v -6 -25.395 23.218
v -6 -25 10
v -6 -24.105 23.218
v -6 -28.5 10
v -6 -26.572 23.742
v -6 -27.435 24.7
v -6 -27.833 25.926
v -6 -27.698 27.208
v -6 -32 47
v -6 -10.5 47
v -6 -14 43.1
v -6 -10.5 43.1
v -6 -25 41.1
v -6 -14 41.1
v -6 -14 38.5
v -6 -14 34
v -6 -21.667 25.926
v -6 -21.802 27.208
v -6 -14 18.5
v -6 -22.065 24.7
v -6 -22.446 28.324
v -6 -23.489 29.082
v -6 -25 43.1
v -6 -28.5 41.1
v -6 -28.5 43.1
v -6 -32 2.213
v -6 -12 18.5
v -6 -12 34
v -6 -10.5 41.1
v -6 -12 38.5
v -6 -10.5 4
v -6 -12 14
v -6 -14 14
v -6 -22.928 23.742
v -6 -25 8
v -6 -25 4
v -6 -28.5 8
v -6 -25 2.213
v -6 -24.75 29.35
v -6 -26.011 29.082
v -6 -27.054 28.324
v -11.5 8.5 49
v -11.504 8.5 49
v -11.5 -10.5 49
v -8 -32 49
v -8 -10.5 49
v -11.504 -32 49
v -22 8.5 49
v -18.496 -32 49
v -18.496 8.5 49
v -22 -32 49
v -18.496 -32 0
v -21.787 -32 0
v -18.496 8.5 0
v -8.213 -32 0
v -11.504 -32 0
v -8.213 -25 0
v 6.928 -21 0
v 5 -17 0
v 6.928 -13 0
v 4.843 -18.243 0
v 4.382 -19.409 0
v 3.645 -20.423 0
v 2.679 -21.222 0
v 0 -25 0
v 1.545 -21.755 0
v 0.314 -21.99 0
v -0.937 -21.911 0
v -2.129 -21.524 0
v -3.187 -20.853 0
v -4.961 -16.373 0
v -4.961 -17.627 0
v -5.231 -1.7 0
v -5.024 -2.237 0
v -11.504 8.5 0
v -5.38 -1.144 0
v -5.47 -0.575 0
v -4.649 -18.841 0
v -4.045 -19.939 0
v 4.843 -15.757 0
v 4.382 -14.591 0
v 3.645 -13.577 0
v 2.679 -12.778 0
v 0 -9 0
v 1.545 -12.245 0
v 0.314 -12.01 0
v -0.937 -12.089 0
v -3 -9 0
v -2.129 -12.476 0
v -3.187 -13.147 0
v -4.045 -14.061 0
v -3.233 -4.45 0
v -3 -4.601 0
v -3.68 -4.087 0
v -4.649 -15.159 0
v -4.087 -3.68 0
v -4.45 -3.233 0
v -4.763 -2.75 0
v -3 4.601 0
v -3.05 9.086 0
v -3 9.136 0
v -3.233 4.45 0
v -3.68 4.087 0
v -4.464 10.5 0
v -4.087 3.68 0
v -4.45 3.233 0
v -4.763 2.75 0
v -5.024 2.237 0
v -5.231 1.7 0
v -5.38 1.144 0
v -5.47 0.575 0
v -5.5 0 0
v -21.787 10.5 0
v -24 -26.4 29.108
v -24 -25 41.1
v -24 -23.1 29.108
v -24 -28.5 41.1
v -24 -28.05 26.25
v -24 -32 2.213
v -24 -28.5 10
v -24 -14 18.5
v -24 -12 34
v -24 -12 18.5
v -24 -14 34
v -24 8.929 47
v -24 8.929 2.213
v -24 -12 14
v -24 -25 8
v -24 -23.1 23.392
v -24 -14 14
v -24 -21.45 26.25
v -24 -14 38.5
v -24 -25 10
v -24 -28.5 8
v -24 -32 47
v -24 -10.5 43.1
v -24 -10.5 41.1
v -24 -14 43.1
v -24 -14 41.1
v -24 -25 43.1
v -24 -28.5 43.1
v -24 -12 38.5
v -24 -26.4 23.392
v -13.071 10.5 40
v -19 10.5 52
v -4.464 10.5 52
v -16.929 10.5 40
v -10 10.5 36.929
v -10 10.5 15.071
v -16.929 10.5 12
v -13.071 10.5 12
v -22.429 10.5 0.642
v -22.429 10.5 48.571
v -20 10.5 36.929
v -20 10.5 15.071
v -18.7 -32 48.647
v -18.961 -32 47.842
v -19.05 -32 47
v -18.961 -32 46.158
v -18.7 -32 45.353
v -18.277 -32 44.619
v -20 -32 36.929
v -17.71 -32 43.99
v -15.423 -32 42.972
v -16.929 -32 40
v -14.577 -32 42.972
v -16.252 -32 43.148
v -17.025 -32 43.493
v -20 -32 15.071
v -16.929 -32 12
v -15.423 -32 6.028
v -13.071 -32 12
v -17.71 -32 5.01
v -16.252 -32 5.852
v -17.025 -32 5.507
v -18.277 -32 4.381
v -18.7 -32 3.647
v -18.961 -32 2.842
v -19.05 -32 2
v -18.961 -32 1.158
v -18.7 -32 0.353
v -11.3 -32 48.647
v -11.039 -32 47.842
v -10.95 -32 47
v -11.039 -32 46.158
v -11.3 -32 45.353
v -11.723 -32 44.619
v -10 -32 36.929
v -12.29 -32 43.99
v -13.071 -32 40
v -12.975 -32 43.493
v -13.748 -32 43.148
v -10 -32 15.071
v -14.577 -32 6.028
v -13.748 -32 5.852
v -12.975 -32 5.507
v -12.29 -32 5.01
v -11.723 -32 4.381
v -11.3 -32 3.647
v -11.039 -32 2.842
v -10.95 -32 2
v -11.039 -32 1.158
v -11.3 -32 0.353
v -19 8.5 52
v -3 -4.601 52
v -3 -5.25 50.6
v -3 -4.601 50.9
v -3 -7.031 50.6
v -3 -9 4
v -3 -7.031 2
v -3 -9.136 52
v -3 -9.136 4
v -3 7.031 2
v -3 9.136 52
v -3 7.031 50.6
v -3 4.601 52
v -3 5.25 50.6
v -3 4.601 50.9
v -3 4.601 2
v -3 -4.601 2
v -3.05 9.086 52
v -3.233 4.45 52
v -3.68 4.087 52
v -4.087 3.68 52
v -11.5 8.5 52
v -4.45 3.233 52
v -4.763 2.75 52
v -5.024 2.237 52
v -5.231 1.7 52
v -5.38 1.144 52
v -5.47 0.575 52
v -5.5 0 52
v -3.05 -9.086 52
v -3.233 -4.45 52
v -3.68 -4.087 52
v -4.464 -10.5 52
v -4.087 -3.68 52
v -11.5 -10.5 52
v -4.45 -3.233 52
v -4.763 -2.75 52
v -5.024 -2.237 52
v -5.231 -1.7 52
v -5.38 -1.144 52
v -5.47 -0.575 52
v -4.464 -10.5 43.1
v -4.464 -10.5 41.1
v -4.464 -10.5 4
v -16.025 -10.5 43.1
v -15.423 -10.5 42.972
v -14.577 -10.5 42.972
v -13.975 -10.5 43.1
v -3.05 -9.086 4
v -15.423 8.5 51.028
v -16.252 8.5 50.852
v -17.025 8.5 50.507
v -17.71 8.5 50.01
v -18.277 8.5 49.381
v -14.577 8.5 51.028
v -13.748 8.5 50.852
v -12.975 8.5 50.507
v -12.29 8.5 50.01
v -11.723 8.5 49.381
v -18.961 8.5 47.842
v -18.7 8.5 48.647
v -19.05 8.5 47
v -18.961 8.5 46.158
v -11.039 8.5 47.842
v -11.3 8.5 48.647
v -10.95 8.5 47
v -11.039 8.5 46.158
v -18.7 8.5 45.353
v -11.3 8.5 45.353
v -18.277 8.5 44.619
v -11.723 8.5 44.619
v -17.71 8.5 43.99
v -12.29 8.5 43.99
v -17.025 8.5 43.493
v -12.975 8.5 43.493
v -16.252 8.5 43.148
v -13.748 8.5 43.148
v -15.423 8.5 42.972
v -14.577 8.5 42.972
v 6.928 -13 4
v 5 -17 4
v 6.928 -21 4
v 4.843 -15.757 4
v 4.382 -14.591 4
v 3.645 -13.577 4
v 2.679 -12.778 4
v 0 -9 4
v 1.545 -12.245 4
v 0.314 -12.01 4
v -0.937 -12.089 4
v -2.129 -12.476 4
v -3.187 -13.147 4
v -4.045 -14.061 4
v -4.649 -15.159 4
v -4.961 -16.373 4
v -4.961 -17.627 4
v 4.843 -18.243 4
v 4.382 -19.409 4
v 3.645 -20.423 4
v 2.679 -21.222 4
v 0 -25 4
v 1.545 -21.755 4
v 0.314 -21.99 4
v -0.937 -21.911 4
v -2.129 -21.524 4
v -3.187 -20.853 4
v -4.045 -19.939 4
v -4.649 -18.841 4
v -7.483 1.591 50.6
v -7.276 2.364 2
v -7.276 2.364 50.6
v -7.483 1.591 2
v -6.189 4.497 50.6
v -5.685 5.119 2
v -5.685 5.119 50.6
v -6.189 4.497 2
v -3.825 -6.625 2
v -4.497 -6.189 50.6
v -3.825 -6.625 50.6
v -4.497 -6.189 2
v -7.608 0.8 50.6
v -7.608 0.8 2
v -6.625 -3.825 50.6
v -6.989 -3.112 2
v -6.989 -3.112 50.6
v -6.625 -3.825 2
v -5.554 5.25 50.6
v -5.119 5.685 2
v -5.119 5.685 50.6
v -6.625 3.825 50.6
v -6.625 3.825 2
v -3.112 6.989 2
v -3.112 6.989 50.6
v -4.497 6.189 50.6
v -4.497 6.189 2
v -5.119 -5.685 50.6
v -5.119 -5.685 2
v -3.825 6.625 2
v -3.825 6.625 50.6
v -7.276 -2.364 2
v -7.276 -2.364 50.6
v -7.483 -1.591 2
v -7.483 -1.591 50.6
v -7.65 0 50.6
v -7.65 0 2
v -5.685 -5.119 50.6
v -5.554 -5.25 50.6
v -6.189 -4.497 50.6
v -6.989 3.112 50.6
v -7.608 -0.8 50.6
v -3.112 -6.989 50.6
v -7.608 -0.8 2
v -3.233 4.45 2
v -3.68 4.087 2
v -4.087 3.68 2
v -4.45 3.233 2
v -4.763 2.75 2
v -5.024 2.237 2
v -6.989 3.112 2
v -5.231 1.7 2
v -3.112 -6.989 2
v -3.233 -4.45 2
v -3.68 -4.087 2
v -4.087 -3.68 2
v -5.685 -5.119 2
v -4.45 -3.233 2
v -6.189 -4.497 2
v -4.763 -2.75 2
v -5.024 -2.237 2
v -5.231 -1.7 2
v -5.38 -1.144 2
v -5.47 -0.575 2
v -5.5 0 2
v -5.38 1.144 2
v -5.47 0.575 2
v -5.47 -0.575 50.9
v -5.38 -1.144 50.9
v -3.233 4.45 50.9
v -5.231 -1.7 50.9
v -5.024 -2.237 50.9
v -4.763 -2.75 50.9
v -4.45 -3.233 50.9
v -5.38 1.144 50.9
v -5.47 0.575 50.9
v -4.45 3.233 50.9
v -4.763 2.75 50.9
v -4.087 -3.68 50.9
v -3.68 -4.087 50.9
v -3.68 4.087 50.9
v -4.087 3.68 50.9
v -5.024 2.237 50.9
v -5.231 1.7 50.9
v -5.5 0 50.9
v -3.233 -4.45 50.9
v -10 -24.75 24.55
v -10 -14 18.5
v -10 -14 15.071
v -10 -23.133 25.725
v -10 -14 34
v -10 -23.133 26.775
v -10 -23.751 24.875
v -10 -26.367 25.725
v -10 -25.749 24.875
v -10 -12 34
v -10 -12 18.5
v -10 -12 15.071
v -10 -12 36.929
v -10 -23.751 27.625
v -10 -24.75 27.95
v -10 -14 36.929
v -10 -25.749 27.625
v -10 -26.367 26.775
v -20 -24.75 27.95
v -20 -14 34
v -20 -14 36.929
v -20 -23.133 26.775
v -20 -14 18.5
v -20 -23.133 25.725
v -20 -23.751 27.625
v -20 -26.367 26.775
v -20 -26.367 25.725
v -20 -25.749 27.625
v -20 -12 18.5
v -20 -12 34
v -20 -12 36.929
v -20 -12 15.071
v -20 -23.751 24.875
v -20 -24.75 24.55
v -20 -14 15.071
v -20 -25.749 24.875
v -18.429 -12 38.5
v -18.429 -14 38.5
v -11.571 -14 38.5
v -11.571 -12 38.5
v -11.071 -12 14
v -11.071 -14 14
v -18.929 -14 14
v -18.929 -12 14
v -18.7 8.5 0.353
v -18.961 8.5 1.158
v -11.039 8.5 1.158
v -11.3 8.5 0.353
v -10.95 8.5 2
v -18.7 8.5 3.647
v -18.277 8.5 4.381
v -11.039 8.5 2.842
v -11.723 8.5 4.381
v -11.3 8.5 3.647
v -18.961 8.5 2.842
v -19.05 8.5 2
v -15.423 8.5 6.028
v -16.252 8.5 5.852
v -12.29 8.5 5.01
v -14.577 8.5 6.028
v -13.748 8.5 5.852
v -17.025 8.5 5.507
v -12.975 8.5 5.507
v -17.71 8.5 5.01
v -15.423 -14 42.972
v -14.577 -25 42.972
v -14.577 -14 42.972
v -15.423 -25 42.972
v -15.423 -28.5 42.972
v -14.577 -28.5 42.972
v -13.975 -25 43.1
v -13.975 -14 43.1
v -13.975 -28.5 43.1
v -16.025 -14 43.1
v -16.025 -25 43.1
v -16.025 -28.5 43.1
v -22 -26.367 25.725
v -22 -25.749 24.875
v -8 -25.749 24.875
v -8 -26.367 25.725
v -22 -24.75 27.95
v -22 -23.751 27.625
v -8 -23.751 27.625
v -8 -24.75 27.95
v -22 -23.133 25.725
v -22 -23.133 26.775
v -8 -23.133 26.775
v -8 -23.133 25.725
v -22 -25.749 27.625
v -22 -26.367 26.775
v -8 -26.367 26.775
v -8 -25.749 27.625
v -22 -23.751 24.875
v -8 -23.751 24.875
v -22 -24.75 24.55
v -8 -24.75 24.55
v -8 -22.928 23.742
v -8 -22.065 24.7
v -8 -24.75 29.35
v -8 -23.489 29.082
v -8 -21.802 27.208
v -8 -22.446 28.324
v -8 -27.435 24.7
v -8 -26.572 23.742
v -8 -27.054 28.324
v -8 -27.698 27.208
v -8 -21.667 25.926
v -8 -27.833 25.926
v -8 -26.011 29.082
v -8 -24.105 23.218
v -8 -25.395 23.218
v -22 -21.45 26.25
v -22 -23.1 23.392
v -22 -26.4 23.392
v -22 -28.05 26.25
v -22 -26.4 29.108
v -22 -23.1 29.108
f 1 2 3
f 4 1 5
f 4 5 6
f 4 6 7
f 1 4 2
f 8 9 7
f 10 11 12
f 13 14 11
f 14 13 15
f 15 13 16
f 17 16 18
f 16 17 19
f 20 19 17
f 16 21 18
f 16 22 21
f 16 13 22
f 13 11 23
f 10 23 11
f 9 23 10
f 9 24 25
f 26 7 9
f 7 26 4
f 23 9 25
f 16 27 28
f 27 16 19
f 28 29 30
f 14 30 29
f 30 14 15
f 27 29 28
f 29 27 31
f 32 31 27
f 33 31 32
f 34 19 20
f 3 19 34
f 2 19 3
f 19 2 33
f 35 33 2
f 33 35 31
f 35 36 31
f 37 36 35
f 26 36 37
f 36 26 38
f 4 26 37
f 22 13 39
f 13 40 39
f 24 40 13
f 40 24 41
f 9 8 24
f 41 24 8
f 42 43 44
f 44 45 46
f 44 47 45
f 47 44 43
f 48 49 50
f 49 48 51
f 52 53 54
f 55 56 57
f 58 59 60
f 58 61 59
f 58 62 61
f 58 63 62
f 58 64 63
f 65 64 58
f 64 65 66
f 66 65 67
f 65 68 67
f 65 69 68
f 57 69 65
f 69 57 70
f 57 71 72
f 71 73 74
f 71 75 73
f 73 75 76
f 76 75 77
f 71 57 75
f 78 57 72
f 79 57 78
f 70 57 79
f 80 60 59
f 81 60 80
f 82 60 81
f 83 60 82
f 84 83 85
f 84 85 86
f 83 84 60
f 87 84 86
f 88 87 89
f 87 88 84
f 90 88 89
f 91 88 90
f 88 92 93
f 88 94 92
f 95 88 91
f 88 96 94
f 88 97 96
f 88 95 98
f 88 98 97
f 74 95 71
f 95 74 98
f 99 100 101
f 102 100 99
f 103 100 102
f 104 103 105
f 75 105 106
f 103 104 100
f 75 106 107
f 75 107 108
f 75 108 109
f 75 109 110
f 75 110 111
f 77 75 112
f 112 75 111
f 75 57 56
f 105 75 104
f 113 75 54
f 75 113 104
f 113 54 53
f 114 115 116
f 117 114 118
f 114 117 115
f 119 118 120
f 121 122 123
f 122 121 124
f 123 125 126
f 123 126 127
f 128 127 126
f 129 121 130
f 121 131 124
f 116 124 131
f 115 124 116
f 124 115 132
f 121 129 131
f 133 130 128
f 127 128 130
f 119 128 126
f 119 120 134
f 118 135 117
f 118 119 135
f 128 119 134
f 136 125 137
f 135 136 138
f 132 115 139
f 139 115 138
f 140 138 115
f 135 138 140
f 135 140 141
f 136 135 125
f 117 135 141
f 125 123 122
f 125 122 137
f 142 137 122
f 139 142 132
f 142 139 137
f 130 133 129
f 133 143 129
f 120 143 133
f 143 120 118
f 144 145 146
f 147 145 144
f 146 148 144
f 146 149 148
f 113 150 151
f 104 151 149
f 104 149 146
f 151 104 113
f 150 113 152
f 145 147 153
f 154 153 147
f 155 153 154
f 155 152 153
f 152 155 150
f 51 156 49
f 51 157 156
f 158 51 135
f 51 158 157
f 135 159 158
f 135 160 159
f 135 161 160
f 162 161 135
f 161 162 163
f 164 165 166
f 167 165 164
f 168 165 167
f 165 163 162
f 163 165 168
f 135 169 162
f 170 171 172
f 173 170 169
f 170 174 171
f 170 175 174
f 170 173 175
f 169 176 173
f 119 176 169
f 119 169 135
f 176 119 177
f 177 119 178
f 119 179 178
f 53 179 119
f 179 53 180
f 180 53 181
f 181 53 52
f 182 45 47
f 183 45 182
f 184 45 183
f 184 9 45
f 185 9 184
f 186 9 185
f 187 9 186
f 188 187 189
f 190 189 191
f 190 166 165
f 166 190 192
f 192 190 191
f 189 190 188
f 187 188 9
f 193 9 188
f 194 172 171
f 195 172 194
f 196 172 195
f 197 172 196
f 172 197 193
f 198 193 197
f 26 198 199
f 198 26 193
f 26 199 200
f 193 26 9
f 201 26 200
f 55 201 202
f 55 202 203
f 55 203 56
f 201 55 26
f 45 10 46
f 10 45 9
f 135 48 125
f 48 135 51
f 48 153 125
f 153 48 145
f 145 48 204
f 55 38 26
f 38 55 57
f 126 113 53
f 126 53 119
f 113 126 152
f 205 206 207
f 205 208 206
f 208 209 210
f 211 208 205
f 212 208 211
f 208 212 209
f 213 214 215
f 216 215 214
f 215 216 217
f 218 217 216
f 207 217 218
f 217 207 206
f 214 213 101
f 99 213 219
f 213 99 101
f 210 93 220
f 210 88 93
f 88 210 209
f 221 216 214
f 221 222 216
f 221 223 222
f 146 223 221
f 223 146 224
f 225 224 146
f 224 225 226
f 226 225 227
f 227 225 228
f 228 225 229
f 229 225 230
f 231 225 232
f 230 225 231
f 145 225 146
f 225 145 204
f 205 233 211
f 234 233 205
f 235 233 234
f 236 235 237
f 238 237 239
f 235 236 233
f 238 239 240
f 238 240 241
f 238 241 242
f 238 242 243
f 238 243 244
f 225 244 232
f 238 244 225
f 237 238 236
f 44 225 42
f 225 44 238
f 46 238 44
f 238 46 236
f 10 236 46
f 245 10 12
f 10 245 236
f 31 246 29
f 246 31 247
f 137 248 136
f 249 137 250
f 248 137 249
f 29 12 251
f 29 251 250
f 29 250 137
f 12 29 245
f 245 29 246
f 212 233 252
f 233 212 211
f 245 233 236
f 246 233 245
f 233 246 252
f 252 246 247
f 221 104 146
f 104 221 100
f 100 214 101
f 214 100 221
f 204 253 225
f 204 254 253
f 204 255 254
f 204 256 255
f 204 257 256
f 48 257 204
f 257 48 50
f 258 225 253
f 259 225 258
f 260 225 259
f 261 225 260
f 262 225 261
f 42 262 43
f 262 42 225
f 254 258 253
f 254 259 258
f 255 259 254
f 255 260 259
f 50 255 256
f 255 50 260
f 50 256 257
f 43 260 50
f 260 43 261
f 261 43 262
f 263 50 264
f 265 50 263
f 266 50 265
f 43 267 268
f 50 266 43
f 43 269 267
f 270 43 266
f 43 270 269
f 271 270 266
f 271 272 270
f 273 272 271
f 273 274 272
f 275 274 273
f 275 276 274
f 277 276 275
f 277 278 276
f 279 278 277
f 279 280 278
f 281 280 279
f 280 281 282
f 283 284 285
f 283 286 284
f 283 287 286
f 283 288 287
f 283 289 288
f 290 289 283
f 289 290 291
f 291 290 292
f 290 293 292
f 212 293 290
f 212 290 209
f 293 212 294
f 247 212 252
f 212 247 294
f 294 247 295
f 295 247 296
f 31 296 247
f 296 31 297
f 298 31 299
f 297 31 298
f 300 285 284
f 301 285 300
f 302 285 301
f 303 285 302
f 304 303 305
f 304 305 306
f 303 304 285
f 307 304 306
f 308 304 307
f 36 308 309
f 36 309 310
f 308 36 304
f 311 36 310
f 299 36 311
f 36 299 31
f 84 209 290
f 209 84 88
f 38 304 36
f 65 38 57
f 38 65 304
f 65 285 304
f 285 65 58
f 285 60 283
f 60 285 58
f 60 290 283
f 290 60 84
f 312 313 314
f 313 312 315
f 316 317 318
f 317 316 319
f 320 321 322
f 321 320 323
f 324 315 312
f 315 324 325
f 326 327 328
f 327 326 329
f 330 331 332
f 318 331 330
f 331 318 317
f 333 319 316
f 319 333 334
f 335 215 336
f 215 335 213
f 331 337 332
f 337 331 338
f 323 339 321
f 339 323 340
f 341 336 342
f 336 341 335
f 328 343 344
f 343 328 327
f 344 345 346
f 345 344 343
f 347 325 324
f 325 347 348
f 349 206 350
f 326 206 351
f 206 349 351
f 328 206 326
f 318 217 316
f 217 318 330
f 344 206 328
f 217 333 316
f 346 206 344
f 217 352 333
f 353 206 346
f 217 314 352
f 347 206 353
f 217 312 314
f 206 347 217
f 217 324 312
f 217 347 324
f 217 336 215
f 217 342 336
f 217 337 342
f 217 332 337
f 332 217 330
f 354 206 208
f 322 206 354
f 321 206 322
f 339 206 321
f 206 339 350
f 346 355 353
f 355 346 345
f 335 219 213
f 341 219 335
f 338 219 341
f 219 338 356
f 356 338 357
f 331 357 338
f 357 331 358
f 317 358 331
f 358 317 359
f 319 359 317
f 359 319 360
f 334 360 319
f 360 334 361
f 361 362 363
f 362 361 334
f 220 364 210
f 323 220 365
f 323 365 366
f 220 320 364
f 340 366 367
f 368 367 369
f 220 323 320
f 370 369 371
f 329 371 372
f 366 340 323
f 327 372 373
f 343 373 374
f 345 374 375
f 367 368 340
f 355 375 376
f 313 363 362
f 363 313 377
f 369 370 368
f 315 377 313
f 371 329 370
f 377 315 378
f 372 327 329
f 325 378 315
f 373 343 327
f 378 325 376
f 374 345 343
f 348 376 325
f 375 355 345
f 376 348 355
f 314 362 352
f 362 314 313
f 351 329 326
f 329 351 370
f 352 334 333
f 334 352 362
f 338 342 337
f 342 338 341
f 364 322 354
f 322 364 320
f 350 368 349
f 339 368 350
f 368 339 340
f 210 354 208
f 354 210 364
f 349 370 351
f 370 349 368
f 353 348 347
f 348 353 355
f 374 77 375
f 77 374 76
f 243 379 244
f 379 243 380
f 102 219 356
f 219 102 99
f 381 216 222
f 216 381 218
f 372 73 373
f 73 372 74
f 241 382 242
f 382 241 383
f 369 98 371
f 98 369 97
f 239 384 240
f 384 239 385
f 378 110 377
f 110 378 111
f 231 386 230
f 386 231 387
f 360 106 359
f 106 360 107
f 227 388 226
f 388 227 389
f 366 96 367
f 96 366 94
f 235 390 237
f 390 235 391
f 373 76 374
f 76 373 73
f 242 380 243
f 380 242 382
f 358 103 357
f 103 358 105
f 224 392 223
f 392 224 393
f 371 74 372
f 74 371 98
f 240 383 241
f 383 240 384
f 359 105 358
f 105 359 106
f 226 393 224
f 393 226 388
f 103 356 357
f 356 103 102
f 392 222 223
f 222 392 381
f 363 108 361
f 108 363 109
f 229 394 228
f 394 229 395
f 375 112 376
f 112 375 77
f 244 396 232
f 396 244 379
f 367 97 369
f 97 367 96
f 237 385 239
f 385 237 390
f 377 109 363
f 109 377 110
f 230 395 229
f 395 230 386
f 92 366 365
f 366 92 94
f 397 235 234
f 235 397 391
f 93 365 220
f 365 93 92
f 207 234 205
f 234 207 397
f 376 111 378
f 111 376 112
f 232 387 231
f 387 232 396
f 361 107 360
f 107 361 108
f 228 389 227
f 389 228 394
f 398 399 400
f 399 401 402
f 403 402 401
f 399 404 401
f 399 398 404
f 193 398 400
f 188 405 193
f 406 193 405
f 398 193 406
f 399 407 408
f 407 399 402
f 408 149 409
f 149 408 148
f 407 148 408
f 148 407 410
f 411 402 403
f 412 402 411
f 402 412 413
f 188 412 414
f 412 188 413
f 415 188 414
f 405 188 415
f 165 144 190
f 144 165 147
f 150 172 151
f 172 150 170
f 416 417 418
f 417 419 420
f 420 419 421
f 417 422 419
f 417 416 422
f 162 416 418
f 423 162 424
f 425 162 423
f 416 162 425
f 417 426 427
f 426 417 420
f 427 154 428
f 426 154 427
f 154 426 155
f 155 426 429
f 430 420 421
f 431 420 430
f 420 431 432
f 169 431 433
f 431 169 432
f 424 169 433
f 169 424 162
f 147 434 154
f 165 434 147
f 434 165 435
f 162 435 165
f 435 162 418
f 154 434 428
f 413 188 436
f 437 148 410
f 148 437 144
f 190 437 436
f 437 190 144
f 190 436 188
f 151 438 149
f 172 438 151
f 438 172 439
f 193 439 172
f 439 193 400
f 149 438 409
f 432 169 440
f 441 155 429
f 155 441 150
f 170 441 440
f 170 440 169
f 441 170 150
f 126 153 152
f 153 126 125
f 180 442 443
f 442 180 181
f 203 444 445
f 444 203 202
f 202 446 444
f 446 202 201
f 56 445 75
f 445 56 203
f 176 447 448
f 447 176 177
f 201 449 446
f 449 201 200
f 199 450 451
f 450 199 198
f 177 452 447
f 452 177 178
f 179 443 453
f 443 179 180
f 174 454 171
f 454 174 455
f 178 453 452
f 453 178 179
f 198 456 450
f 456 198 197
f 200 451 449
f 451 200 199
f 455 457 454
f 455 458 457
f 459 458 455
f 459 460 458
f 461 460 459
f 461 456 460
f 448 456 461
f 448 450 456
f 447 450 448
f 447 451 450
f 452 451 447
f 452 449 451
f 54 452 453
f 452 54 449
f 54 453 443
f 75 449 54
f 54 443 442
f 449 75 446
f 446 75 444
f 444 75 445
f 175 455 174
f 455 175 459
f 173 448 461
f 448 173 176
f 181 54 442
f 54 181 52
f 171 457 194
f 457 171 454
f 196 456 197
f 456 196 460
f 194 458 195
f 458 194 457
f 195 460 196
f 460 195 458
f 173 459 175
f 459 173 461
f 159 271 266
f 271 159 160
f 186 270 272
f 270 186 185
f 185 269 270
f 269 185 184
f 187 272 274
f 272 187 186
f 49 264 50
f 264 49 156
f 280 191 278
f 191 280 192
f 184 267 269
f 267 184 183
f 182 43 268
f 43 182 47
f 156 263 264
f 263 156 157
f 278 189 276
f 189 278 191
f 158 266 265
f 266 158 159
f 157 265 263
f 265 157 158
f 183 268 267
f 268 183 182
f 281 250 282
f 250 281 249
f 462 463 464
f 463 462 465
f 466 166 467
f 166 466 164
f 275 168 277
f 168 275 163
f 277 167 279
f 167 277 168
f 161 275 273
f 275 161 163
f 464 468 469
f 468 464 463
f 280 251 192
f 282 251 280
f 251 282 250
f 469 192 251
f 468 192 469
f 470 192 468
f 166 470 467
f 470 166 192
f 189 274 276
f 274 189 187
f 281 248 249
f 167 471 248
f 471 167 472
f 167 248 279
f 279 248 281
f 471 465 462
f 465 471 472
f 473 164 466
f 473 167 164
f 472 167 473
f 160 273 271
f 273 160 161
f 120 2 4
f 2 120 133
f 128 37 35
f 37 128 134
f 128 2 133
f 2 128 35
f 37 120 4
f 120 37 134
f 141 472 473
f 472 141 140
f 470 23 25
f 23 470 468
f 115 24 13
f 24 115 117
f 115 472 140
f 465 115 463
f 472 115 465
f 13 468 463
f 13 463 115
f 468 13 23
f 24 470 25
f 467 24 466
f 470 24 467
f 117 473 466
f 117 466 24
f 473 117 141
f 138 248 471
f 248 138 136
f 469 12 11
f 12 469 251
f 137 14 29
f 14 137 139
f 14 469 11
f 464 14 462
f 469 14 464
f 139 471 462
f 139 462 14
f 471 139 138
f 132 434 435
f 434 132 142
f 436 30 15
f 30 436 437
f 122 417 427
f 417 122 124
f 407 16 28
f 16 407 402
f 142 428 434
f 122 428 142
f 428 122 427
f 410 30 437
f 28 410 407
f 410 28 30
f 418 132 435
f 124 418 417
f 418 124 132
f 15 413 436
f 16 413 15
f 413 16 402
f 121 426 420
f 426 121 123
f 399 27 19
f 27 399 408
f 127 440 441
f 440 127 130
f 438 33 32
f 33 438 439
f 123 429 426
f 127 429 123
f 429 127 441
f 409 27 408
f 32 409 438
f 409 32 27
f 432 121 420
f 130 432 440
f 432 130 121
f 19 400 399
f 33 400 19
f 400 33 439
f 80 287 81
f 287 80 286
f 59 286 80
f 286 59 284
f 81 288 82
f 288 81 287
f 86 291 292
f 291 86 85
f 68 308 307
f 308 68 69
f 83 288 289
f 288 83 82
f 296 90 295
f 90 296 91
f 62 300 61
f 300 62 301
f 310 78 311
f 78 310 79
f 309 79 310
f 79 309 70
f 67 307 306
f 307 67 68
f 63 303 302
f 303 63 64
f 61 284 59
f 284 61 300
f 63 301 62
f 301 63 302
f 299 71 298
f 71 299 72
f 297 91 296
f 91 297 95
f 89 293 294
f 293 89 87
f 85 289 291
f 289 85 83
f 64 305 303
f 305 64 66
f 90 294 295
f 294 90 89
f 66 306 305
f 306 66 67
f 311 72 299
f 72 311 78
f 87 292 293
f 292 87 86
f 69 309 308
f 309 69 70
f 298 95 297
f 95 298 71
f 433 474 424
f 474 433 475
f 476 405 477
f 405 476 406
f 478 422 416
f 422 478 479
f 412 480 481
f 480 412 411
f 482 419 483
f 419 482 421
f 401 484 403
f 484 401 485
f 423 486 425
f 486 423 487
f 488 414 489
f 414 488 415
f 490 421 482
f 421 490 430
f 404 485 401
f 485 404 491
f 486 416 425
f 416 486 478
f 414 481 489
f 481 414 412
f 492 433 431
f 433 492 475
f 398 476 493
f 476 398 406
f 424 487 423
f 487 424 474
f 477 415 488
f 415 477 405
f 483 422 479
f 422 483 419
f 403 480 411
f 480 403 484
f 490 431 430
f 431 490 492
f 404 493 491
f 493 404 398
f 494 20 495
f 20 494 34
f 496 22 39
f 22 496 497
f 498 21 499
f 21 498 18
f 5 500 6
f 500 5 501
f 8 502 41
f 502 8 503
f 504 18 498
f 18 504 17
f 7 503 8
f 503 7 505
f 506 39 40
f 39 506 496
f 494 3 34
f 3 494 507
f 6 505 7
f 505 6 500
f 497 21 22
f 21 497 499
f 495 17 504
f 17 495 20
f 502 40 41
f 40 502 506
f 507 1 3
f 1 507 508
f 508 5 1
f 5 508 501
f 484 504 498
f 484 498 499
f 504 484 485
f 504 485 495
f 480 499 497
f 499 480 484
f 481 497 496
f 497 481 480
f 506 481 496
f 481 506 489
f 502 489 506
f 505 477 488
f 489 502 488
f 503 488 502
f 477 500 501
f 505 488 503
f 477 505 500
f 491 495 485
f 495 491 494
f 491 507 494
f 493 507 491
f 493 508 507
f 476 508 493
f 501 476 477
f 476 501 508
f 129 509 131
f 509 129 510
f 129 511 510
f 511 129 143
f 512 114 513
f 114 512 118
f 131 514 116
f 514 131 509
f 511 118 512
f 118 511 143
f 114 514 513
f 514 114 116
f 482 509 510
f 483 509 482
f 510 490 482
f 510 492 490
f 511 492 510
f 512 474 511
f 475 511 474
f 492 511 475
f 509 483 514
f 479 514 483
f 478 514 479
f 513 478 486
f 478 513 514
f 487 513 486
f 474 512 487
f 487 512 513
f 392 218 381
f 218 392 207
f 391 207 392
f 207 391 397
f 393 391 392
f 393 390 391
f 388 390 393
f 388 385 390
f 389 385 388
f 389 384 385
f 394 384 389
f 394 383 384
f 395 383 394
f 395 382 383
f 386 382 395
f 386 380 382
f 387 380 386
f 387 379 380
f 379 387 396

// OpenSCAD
// file: inc/bearing.scad
// PRUSA iteration3
// Bearing holders
// GNU GPL v3
// Josef Průša <iam@josefprusa.cz> and contributors
// http://www.reprap.org/wiki/Prusa_Mendel
// http://prusamendel.org

bearing_diameter = 15;
thinwall = 3;
bearing_size = bearing_diameter + 2 * thinwall;
tolerance = 0.15;
bearing_height = 52;

module horizontal_bearing_base(bearings=1) {
  translate(v=[0,0,6]) cube(size = [24,8+bearings*25,12], center = true);
}

module horizontal_bearing_holes(bearings=1) {
  cutter_lenght = 10+bearings*25;
  one_holder_lenght = 8+25;
  holder_lenght = 8+bearings*25;

  // Main bearing cut
  difference() {
    translate(v = [0,0,12]) rotate(a = [90,0,0]) translate(v = [0,0,-cutter_lenght/2]) cylinder(h = cutter_lenght, r = bearing_diameter/2, $fn = 50);
    // Bearing retainers
    translate(v=[0,1-holder_lenght/2,3]) cube(size = [24,6,8], center = true);
    translate(v=[0,-1+holder_lenght/2,3]) cube(size = [24,6,8], center = true);
  }

  // Ziptie cutouts
  ziptie_cut_ofset = 0;

  for (i = [0:bearings-1]) {
    // For easier positioning I move them by half of one
    // bearing holder then add each bearign lenght and then center again
    translate(v = [0,-holder_lenght/2,0]) translate(v = [0,one_holder_lenght/2+i*25,0]) difference(){
      union(){
        translate(v = [0,2-6,12]) rotate(a = [90,0,0]) translate(v = [0,0,0]) cylinder(h = 4, r = 12.5, $fn = 50);
        translate(v = [0,2+6,12]) rotate(a = [90,0,0]) translate(v = [0,0,0]) cylinder(h = 4, r = 12.5, $fn = 50);
      }
      translate(v = [0,10,12]) rotate(a = [90,0,0]) translate(v = [0,0,0]) cylinder(h = 24, r = 10, $fn = 50);
    }
  }
}

module horizontal_bearing_test() {
  difference(){
    horizontal_bearing_base(1);
    horizontal_bearing_holes(1);
  }
  translate(v=[30,0,0]) difference(){
    horizontal_bearing_base(2);
    horizontal_bearing_holes(2);
  }
  translate(v=[60,0,0]) difference(){
    horizontal_bearing_base(3);
    horizontal_bearing_holes(3);
  }
}



module vertical_bearing_base(height) {
  translate(v = [-bearing_size/2-3,bearing_size/2-1,height-2.5]) cube(size = [17,2,5], center = true);
  difference(){
  translate(v = [-2-bearing_size/4,0,height/2]) cube(size = [bearing_size/2-2,bearing_size,height], center = true);
  //cylinder(h = height, r=bearing_size/2, $fn = 90);
    //nice edge
   translate (v = [2.2-bearing_size/4,-bearing_size/2,height/2]) rotate ([0,0,45]) cube(size=[2,2,60],center=true);
   translate (v = [2.2-bearing_size/4,bearing_size/2,height/2]) rotate ([0,0,45]) cube(size=[2,2,60],center=true);  //translate(v = [-2-bearing_size/4,0,height/2]) 
  }    
}

module vertical_bearing_holes(height) {
  
  translate(v = [0,0,2]) cylinder(h = height+tolerance*2, r = bearing_diameter/2+tolerance, $fn = 60);
    //translate(v = [-bearing_diameter/2,0,height/2]) cube([4,bearing_diameter+2,10], center = true);
   translate(v = [0,0,-2]) cylinder(h = height*2, r = bearing_diameter/2-2, $fn = 60);
  
}

difference() {
  vertical_bearing_base(bearing_height);
  vertical_bearing_holes(bearing_height-3.70);
    
 }
translate(v = [-2-bearing_size/4,0,bearing_height-2]) cube(size = [bearing_size/2-2,bearing_size/2,tolerance*2], center = true) ;
//vertical_bearing_holes(50);
// file: inc/x-end.scad
// PRUSA iteration3
// X end prototype
// GNU GPL v3
// Josef Průša <iam@josefprusa.cz> and contributors
// http://www.reprap.org/wiki/Prusa_Mendel
// http://prusamendel.org

use <bearing.scad>
rod_distance = 45;
m5_tolerance = 0.3;
//bearings
bearing_diameter = 15;
thinwall = 3;
bearing_size = bearing_diameter + 2 * thinwall;
tolerance = 0.15;
bearing_height = 52;
smooth_rod_diam=8;
smooth_rod_diam_tolerance=0.1;

module x_end_base() {
  // Main block
  height = 49;

  difference() {
    translate(v = [-15,-9-3.5/2,height/2]) cube(size = [18,39+3.5,height], center = true);
    // Top corners cutouts
    translate([-15+7,-20,51-2]) rotate([0,45,0]) translate([-15,-15,0]) cube([30,60,30]);
    translate([-15-18+11,-20,51-2]) rotate([0,-45,0]) translate([-15,-15,0]) cube([30,60,30]);
    // Bottom corners cutout
    translate([-15+7,-20,-19-2]) rotate([0,45,0]) translate([-15,-15,0]) cube([30,60,30]);
    translate([-15-18+11,-20,-19-2]) rotate([0,-45,0]) translate([-15,-15,0]) cube([30,60,30]);
  }

  // Bearing holder
  difference(){
    vertical_bearing_base(bearing_height);
        translate([-15-18+11,-20,51-2]) rotate([0,-45,0]) translate([-15,-15,0]) cube([30,60,30]);
  
  }
  // Nut trap
  // Cube
  translate(v = [-2-2-1,-17,2]) cube(size = [8+2,16,4], center = true);
  // Hexagon
  translate(v = [0,-17,0]) rotate([0,0,30]) cylinder(h = 4, r = 8, $fn = 6);
}

module x_end_holes() {
  vertical_bearing_holes(bearing_height-3.70);

  // Belt hole
  translate(v = [-1,0,-4])

  difference() {
    translate(v = [-5.5-10+1.5,-10,30]) cube(size = [10,46,28], center = true);

  	// Nice edges
  	translate(v = [-5.5-10+1.5,-10,30+23]) rotate([0,45,0]) cube(size = [10,46,28], center = true);
  	translate(v = [-5.5-10+1.5,-10,30+23]) rotate([0,-45,0]) cube(size = [10,46,28], center = true);
  	translate(v = [-5.5-10+1.5,-10,30-23]) rotate([0,45,0]) cube(size = [10,46,28], center = true);
  	translate(v = [-5.5-10+1.5,-10,30-23]) rotate([0,-45,0]) cube(size = [10,46,28], center = true);
      
      

}
translate(v = [-40,0,25]) rotate([0,0,45]) cube(size = [46,10,56], center = true);
  // Bottom pushfit rod
  translate(v = [-15,-41.5,2]) rotate(a = [-90,0,0]) pushfit_rod(smooth_rod_diam+smooth_rod_diam_tolerance,50);

  // Top pushfit rod
  translate(v = [-15,-41.5,rod_distance+2]) rotate(a = [-90,0,0]) pushfit_rod(smooth_rod_diam+smooth_rod_diam_tolerance,50);

  // Ziptie for holding smooth rods
  translate([-30,-28.5,8]) cube([30,3.5,2]);
  translate([-30,-28.5,49-6-1.9]) cube([30,3.5,2]);
  translate([-30,-14,49-6-1.9]) cube([30,3.5,2]);


  // Ziptie for holding bearings
  translate([-30,-14,bearing_height-2-16]) cube([30,2,4.5]);
  translate([-30,-14,2+12]) cube([30,2,4.5]);
  translate([-30,+12,bearing_height-2-16]) cube([30,2,4.5]);
  translate([-30,+12,2+12]) cube([30,2,4.5]);

  // Nut trap removed : leadswcrew is free! 
  translate(v = [0,-17,-0.5]) cylinder(h = 15, r = 5, $fn = 25);
  //translate(v = [0,-17,3]) rotate([0,0,30]) cylinder(h = 10, r=4.5+m5_tolerance/2, $fn = 6);
}

// Final prototype
module x_end_plain() {
  difference() {
    x_end_base();
    x_end_holes();
  }
  //embedded support for top bearing cap:
  translate(v = [-2-bearing_size/4,0,bearing_height-1.25 ]) cube(size = [bearing_size/2-2,bearing_size/2,tolerance*2], center = true) ;

}

x_end_plain();

module pushfit_rod(diameter,length) {
  cylinder(h = length, r = diameter/2, $fn = 30);
  /*difference() {
 	  translate(v = [0,-diameter/2.85,length/2]) rotate([0,0,45]) cube(size = [diameter/2,diameter/2,length], center = true);
 	  translate(v = [0,-diameter/4-diameter/2-0.4,length/2]) rotate([0,0,0]) cube(size = [diameter,diameter/2,length], center = true);
  }*/
  //translate(v=[0,-diameter/2-2,length/2]) cube(size = [diameter,1,length], center = true);
}
// main file
// PRUSA iteration3
// X end idler
// GNU GPL v3
// Josef Průša <iam@josefprusa.cz> and contributors
// http://www.reprap.org/wiki/Prusa_Mendel
// http://prusamendel.org

use <inc/x-end.scad>
bearing_height = 52;
bearing_diameter = 15;
thinwall = 3;
bearing_size = bearing_diameter + 2 * thinwall;
tolerance = 0.15;



module x_end_idler_base() {
  x_end_base();
}

module x_end_idler_holes() {
  x_end_holes();
  translate(v = [0,-23-3.5/2,30.25-4]) rotate(a = [0,-90,0]) cylinder(h = 80, r = 1.7, $fn = 10);
  translate(v = [2,-23-3.5/2,30.25-4]) rotate(a = [0,-90,0]) cylinder(h = 10, r = 3.1, $fn = 15);
  translate(v = [-22,-23-3.5/2,30.25-4]) rotate(a = [0,-90,0]) rotate(a = [0,0,30]) cylinder(h = 80, r = 3.3, $fn = 6);
}

// Final part
module x_end_idler(){
  difference() {
    x_end_idler_base();
    x_end_idler_holes();
  }
}
//embedded support for top bearing cap:
  translate(v = [-2-bearing_size/4,0,bearing_height-1.25 ]) cube(size = [bearing_size/2-2,bearing_size/2,tolerance*2], center = true) ;

x_end_idler();
